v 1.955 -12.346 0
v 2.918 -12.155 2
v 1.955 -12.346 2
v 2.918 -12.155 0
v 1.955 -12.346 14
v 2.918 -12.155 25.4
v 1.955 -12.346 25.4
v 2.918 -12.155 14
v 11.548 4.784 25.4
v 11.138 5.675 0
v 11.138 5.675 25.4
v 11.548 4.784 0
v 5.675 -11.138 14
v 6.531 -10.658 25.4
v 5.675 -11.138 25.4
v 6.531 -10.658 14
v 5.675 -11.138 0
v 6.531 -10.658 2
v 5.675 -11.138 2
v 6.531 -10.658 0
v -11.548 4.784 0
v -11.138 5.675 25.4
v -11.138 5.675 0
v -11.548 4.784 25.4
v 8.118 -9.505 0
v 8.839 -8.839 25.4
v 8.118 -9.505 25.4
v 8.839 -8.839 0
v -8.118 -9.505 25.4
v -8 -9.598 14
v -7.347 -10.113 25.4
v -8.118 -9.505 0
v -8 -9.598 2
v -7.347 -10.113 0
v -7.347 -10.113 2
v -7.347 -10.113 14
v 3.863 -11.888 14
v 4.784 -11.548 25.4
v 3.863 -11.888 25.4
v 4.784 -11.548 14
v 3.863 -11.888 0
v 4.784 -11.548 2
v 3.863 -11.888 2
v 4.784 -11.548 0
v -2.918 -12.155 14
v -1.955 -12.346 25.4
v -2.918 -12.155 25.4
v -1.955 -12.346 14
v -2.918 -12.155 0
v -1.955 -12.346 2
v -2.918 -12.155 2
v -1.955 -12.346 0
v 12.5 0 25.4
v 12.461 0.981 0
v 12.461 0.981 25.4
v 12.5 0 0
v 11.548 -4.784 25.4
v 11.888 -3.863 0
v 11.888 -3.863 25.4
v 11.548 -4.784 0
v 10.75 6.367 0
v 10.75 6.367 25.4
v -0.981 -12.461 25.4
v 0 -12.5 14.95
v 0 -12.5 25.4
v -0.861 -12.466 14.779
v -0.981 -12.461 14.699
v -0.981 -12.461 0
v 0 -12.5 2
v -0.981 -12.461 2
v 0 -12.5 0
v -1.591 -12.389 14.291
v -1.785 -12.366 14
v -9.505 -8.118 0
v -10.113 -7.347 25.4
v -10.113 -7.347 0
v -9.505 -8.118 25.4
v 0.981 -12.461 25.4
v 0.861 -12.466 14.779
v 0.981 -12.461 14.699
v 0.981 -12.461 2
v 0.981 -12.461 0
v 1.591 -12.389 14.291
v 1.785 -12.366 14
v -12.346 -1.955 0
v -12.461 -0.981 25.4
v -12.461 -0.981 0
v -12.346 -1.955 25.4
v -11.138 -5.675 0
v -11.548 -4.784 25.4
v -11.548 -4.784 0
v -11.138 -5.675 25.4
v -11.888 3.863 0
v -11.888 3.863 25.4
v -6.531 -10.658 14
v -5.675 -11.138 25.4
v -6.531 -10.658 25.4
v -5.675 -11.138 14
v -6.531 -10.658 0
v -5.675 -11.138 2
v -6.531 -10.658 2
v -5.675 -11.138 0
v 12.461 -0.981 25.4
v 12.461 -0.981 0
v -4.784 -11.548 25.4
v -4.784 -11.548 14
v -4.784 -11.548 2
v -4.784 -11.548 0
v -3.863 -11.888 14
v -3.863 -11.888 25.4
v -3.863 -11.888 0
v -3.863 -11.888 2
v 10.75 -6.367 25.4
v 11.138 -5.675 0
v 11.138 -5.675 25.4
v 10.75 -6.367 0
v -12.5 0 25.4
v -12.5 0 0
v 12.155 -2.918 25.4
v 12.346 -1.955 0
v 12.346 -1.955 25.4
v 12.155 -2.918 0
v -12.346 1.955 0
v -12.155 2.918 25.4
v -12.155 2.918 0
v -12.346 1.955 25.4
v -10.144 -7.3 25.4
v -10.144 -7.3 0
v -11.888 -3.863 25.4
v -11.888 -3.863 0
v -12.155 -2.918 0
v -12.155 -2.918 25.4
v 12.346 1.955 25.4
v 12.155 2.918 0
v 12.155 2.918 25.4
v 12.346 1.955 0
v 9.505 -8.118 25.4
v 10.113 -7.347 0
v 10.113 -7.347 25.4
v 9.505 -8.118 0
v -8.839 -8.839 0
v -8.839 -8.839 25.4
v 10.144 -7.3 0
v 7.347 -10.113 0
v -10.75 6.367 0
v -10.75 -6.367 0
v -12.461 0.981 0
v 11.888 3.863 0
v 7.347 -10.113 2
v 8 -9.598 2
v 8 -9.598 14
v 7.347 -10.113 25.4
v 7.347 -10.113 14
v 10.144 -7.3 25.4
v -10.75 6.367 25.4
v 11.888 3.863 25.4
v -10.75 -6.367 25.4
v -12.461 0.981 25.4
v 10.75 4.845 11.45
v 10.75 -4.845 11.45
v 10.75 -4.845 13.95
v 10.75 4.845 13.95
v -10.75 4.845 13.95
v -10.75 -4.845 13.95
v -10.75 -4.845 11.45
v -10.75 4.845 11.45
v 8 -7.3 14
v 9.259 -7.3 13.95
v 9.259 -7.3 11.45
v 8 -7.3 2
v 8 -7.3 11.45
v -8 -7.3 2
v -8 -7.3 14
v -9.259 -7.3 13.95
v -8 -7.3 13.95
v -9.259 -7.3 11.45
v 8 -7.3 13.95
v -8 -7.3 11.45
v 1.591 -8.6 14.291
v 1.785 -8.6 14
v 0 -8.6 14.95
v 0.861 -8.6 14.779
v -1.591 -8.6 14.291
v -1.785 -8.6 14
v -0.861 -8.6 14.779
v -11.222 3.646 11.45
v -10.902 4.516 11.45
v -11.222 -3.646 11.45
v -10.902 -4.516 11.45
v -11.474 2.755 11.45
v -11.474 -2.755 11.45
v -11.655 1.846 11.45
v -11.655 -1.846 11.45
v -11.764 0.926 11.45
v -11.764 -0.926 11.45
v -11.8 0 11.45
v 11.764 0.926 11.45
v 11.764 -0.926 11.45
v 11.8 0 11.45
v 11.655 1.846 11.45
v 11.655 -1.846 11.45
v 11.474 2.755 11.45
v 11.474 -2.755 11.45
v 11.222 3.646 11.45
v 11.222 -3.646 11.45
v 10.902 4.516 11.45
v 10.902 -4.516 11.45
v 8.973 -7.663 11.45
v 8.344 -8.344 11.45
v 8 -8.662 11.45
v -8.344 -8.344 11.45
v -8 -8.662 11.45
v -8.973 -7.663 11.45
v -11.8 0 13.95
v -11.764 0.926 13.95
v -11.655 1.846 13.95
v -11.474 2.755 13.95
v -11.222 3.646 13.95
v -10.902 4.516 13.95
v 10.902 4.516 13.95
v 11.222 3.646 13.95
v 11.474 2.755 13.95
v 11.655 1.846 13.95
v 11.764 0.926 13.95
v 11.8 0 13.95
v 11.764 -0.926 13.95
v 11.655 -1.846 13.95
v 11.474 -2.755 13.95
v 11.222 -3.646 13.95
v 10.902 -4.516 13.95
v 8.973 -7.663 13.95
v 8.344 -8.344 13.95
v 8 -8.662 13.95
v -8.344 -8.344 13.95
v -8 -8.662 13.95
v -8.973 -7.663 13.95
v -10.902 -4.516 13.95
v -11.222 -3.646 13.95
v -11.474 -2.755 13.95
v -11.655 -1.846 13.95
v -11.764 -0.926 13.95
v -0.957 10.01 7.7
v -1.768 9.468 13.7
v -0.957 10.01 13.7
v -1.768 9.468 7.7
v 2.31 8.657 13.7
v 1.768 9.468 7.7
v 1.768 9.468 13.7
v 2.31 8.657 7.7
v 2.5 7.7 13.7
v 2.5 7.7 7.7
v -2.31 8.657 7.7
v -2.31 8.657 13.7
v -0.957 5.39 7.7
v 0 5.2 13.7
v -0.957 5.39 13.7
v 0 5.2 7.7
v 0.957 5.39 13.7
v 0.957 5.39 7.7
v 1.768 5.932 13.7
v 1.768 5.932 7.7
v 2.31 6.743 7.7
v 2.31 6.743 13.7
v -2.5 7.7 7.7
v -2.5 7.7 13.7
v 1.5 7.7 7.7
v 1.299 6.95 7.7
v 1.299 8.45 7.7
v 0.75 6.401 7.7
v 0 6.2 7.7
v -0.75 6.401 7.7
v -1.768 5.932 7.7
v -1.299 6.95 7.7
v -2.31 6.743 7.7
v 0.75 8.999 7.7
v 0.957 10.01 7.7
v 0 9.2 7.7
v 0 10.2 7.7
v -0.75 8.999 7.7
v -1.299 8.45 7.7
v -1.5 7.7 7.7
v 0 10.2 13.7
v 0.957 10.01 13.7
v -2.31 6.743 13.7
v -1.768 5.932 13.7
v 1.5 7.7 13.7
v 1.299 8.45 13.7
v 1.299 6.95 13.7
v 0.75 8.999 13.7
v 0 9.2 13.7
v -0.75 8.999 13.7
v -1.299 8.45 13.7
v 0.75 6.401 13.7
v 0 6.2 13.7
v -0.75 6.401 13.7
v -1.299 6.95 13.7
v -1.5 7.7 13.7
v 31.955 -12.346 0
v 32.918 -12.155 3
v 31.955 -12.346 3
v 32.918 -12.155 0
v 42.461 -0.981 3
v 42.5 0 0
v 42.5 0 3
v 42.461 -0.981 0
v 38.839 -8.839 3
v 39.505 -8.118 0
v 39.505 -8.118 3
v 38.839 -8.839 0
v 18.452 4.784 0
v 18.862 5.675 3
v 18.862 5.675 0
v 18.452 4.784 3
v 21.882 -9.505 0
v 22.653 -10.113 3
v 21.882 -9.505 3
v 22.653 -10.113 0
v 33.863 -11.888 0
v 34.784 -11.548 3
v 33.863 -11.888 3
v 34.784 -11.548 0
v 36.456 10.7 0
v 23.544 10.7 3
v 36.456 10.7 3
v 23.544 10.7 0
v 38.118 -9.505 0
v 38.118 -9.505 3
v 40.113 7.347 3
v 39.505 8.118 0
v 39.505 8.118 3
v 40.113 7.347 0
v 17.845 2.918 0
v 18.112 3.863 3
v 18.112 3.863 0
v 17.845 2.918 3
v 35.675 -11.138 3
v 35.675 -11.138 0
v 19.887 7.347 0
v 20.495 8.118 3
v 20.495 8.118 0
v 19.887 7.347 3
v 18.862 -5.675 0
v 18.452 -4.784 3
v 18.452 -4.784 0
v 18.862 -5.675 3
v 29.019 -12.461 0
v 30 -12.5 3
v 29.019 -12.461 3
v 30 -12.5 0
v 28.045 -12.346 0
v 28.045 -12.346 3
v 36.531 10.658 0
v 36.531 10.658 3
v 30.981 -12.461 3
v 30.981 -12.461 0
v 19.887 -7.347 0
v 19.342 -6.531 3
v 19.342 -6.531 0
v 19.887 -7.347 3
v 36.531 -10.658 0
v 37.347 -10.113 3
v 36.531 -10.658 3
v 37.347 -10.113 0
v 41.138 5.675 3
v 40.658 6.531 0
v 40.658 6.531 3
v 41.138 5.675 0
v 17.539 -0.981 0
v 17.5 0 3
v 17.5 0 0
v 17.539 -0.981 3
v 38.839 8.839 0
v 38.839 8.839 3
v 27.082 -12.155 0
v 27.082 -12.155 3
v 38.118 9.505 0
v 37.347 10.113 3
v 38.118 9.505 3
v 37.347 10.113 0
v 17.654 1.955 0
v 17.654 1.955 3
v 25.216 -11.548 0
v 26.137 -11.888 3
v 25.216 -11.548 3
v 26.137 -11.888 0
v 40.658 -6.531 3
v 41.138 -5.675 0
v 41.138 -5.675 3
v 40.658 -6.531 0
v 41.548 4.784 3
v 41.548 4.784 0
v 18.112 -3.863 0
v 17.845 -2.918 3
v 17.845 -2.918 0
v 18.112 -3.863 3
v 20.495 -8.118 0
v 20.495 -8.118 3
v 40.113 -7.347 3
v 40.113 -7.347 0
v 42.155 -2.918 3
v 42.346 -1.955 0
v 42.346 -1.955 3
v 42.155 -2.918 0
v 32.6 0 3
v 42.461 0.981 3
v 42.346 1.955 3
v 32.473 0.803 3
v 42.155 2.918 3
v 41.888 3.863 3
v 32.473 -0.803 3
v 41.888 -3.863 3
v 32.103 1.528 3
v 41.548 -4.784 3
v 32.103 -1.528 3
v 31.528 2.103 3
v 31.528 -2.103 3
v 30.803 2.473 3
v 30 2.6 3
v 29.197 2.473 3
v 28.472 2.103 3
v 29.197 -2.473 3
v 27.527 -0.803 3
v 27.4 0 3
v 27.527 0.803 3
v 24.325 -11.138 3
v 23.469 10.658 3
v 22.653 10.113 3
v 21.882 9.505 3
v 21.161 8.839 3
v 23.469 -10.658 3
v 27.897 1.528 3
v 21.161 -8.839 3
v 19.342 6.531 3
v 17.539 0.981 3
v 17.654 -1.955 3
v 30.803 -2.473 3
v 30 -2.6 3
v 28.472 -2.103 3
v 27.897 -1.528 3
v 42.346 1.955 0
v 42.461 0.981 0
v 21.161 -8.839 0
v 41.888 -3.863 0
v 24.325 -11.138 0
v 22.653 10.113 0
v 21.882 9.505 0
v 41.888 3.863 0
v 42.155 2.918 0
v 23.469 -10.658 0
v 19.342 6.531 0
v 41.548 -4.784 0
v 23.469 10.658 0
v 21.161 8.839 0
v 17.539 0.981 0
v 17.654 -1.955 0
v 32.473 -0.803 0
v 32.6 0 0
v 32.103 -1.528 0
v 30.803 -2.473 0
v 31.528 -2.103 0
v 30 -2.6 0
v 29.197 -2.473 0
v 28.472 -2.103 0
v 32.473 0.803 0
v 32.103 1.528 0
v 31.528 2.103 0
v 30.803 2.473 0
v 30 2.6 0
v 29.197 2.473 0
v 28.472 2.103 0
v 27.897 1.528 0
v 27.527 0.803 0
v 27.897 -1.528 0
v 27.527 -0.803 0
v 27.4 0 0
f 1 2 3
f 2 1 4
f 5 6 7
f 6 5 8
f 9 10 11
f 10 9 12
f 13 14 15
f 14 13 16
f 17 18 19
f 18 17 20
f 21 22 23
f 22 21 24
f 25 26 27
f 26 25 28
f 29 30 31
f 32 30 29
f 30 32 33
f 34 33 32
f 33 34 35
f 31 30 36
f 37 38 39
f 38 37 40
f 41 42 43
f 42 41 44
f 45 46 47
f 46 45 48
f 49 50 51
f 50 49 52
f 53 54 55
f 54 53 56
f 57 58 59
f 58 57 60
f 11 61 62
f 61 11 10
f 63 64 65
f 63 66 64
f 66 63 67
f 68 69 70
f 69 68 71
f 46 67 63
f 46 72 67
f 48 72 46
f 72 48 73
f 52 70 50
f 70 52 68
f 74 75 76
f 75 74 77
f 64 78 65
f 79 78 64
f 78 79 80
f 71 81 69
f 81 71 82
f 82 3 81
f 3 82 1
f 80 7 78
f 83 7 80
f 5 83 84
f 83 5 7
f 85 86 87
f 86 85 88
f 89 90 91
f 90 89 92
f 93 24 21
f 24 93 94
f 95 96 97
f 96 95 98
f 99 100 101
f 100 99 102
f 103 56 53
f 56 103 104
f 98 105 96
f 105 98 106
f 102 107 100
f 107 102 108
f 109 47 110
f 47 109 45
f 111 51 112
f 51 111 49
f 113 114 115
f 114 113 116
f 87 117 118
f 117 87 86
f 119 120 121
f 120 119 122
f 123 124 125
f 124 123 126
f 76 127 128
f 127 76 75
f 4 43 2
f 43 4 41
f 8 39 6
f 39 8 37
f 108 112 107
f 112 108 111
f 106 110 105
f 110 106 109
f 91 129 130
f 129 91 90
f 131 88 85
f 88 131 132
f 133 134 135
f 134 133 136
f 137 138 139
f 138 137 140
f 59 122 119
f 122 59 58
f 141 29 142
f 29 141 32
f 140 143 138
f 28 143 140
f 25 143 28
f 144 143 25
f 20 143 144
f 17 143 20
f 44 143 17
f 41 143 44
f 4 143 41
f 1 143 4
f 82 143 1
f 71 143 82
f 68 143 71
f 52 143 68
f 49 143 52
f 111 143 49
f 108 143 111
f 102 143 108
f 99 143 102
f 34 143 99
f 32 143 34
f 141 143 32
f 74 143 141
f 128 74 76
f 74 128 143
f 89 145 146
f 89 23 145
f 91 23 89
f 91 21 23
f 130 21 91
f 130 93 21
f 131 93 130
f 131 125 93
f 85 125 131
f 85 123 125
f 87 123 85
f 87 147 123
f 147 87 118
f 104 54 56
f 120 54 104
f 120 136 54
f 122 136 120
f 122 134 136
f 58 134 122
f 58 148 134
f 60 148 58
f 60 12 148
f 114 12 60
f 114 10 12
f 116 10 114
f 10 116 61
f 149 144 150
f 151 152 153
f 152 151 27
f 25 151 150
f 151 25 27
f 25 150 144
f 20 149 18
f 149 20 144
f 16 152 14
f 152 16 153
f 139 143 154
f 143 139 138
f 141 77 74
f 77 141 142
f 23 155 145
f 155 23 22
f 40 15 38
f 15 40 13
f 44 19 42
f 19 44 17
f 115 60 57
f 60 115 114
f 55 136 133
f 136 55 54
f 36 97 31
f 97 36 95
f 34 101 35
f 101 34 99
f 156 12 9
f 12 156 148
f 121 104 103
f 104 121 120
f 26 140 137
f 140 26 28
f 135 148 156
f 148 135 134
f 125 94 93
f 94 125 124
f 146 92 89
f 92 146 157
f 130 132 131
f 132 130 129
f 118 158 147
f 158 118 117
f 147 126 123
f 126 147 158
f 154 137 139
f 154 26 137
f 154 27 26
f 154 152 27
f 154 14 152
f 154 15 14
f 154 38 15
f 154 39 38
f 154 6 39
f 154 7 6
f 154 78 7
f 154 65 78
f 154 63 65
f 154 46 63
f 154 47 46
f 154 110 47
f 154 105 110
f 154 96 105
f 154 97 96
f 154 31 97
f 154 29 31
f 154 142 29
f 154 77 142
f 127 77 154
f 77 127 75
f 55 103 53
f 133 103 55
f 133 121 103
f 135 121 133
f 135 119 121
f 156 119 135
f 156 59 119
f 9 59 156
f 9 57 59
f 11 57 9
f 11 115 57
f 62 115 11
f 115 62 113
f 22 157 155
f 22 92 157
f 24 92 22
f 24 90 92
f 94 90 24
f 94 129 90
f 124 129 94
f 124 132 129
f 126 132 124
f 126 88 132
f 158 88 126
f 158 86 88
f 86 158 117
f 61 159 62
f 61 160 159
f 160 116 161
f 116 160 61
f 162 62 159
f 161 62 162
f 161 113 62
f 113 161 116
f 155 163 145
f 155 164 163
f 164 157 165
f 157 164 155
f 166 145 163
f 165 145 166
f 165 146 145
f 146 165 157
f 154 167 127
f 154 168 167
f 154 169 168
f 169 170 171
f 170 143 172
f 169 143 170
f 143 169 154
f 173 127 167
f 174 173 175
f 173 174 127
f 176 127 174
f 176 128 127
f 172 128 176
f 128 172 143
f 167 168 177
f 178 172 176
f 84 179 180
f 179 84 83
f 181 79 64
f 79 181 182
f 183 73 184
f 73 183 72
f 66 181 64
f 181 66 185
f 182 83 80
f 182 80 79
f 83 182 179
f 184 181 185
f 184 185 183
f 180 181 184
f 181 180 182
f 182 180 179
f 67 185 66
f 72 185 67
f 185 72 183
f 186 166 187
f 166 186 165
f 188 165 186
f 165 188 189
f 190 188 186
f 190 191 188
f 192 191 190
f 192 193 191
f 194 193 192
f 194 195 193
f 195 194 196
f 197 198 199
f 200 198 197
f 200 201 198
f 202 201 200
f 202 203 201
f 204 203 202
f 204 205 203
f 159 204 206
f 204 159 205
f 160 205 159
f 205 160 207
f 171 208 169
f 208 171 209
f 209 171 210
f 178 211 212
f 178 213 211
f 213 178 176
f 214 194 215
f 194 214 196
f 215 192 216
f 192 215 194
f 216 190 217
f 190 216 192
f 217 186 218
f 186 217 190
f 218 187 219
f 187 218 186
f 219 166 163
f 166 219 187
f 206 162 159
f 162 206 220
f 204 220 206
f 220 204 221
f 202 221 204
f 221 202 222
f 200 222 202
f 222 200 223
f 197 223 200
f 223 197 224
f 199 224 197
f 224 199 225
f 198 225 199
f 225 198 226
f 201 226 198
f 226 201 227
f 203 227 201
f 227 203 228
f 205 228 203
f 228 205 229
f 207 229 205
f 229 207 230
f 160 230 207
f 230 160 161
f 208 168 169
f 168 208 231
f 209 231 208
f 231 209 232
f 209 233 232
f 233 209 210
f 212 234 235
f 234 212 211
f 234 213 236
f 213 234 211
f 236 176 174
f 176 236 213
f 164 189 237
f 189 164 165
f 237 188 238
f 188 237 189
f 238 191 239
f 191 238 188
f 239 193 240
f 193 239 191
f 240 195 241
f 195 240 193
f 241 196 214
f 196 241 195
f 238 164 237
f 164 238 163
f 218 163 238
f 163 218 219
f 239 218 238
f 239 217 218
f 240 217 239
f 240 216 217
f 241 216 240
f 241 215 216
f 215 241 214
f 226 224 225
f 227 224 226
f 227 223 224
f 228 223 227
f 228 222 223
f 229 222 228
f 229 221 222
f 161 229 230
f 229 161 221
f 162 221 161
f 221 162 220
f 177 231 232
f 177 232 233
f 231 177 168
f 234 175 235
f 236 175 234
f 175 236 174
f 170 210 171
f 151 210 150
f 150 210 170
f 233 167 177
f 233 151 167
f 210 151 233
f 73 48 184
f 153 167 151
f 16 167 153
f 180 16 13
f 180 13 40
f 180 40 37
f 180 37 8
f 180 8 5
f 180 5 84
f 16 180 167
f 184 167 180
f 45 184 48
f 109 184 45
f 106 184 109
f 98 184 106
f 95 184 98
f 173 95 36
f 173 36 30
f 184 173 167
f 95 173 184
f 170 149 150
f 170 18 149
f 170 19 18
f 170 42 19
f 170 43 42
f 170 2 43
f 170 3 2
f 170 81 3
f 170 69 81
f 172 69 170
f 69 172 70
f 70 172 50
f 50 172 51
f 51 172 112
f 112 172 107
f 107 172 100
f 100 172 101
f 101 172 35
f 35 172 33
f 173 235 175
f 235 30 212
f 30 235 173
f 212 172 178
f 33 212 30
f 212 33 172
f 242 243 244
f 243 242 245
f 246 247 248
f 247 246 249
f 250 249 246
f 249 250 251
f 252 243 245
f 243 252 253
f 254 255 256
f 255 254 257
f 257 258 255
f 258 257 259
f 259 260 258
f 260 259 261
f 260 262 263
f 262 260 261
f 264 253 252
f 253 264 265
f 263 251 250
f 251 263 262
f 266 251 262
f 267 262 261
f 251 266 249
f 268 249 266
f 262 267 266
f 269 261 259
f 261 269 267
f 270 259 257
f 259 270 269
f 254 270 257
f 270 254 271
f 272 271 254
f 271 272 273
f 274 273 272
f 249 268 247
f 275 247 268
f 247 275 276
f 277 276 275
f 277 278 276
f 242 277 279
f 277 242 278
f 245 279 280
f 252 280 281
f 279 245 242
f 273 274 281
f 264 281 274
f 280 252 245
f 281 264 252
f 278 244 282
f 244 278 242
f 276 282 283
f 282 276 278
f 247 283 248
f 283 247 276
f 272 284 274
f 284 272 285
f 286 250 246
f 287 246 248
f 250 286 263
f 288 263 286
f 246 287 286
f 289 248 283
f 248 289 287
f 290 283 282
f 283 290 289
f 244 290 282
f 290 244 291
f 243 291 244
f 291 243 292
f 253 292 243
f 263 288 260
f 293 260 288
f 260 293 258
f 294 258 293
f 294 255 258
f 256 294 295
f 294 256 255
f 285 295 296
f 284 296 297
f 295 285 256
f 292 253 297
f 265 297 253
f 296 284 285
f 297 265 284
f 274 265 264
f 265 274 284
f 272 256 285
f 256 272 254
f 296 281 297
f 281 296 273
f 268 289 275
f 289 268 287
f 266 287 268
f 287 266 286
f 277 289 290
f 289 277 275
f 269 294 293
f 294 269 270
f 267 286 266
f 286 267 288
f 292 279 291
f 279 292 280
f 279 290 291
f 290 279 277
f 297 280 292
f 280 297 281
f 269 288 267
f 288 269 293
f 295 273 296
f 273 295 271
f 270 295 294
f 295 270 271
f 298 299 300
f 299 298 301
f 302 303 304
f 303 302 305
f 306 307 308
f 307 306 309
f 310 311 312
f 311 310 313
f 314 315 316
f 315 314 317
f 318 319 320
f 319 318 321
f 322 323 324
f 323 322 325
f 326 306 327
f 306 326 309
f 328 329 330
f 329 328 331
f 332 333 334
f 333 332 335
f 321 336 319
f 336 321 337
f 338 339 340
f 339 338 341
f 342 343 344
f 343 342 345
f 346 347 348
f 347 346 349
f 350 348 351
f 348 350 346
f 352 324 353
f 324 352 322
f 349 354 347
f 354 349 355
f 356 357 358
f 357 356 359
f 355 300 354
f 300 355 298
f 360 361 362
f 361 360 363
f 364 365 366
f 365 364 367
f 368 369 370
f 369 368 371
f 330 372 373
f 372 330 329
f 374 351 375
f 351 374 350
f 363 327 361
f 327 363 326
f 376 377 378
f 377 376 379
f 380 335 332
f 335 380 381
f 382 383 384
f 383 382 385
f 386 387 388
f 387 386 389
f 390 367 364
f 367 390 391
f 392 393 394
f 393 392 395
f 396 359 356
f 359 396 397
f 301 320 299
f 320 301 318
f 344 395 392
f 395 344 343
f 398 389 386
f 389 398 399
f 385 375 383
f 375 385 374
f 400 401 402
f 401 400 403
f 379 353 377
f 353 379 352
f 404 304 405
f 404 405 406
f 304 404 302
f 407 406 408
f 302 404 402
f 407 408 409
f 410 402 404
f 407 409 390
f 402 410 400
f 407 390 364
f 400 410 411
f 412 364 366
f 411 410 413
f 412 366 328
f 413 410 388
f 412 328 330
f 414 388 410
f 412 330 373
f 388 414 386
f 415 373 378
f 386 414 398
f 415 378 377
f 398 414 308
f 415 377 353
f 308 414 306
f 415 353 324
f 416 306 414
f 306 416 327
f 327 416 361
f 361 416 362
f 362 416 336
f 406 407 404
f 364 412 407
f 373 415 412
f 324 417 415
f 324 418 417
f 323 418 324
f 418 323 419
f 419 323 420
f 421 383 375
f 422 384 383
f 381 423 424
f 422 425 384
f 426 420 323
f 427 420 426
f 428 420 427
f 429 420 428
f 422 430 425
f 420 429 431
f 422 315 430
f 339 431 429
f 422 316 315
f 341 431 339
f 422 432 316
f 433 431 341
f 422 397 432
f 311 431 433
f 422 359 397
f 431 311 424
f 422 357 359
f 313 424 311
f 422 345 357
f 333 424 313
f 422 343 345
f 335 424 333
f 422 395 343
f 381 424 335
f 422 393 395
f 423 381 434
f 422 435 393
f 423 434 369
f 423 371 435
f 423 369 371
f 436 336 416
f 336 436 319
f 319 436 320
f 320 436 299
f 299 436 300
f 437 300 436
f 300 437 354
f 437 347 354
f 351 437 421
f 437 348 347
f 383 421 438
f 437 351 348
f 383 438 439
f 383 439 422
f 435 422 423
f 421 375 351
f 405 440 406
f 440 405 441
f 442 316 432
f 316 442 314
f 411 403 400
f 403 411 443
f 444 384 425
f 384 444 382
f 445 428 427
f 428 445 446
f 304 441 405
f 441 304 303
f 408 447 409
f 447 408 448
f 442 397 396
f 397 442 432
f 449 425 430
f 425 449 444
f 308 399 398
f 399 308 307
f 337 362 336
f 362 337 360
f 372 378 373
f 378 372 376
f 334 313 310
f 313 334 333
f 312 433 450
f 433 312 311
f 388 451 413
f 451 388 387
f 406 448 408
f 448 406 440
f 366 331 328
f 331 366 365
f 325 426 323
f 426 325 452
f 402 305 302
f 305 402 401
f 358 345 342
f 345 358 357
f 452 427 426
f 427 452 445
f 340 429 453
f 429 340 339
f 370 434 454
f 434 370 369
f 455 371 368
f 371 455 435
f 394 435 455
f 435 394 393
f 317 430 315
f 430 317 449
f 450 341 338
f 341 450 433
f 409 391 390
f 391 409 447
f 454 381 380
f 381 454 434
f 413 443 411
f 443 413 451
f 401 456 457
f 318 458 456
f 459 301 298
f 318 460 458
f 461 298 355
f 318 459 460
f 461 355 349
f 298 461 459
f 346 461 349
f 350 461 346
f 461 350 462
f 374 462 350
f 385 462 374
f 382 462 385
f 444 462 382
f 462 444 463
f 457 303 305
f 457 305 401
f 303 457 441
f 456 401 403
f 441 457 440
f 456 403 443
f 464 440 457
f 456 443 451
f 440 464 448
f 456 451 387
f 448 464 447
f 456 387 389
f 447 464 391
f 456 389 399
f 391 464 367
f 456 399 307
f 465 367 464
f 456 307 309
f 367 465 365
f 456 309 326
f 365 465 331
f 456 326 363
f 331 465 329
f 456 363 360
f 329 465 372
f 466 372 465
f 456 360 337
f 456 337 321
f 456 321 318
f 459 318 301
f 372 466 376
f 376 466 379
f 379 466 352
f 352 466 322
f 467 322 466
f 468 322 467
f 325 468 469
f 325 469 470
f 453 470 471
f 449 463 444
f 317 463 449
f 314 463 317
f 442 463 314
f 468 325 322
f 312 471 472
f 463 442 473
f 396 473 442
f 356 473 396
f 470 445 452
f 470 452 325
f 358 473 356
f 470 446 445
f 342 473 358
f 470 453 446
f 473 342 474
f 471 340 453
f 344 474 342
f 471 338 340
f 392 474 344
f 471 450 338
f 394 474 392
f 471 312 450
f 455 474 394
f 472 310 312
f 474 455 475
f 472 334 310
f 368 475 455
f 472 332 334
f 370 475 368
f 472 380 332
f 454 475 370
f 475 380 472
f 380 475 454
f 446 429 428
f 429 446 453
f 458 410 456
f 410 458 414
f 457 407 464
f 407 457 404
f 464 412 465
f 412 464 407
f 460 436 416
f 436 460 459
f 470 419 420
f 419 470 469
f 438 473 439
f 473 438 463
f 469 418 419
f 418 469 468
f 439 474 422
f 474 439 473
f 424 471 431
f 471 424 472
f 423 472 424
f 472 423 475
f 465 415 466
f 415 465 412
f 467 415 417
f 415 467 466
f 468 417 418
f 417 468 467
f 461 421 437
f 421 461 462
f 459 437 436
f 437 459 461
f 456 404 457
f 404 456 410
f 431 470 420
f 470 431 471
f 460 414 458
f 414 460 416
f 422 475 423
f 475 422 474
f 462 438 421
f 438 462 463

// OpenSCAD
/**
 * bird_element_hf.scad — TM-PWR-ENCL-EL-001 Rev A
 * HF / VHF plug-in slug element body
 * 25.0mm OD × 25.4mm, D-flat orientation key, 2mm banana pin
 * Fits Bird Model 43 compatible wattmeter body
 */

// ─── Parameters ──────────────────────────────────────────────────────────────
slug_od      = 25.0;   // Outer diameter (0.2mm under body slot for clearance)
slug_l       = 25.4;   // Length (1.000")
slug_flat    = 1.8;    // Flat depth (from OD surface, creates D-shape)

center_bore  = 5.2;    // Center conductor bore (slightly over 5mm for clearance)
pcb_w        = 21.5;   // PCB slot width
pcb_d        = 18.0;   // PCB slot depth
pcb_t        = 1.8;    // PCB slot thickness (1.6mm PCB + 0.2mm clearance)

banana_d     = 2.2;    // 2mm banana pin hole
banana_x     = slug_l / 2;  // Centered along length
banana_depth = 8;       // Depth of banana pin well

oring_d      = 25.0;   // O-ring groove diameter
oring_w      = 2.5;    // O-ring groove width
oring_depth  = 1.5;    // O-ring groove depth (for 2mm O-ring)
oring_pos    = slug_l / 2;  // O-ring at slug midpoint

// PCB access slot (open bottom for component access during assembly)
slot_w       = 16;
slot_h       = 12;
slot_z       = 2;     // From bottom end of slug

// Label recess (on flat face)
label_w      = 18;
label_h      = 8;
label_depth  = 0.4;   // Engraved text depth

// ─── Modules ──────────────────────────────────────────────────────────────────

module slug_body_profile() {
    // D-shape cross-section: circle with one flat
    difference() {
        circle(d=slug_od, $fn=80);
        translate([-(slug_od), slug_od/2 - slug_flat])
            square([slug_od * 2, slug_od]);
    }
}

module oring_groove() {
    rotate_extrude($fn=80)
        translate([oring_d/2 - oring_depth, 0, 0])
            square([oring_depth + 0.1, oring_w], center=true);
}

// ─── Main Slug Body ───────────────────────────────────────────────────────────
module slug() {
    difference() {
        // D-shaped extruded body
        linear_extrude(slug_l)
            slug_body_profile();

        // Center conductor bore (RF through-hole, centered at circle axis)
        translate([0, 0, -0.1])
            cylinder(d=center_bore, h=slug_l + 0.2, $fn=20);

        // PCB slot (axial, from flat face side)
        translate([-pcb_w/2, slug_od/2 - slug_flat - pcb_d, slug_z_for_pcb()])
            cube([pcb_w, pcb_d + 0.1, pcb_t]);

        // PCB slot continues full length for coaxial components
        translate([-pcb_w/2, slug_od/2 - slug_flat - pcb_d, 0])
            cube([pcb_w, pcb_d, slug_l]);

        // Banana pin hole (bottom center, for slug output contact)
        translate([0, -slug_od/2 - 0.1, banana_x])
            rotate([-90, 0, 0])
                cylinder(d=banana_d, h=banana_depth + 0.1, $fn=16);

        // Banana pin counterbore (wider, for nut/flange)
        translate([0, -slug_od/2 - 0.1, banana_x])
            rotate([-90, 0, 0])
                cylinder(d=4.5, h=4, $fn=16);

        // O-ring groove (at slug midpoint)
        translate([0, 0, oring_pos])
            oring_groove();

        // Label recess (on flat face)
        translate([-label_w/2, slug_od/2 - slug_flat - label_depth, slug_l/2])
            cube([label_w, label_depth + 0.1, label_h], center=false);

        // Component access slot (from round side, for toroid winding access)
        translate([-slot_w/2, -slug_od/2 - 0.1, slot_z])
            cube([slot_w, slug_od/3 + 0.1, slot_h]);
    }

    // Toroid retention boss (center of PCB cavity)
    // Small post that the toroid seats against
    translate([0, slug_od/2 - slug_flat - 3, slug_l/2 - 5])
        difference() {
            cylinder(d=5, h=6, $fn=16);
            cylinder(d=3, h=6.1, $fn=12);  // toroid pin hole
        }
}

function slug_z_for_pcb() = 1.5;  // PCB slot starts 1.5mm from end

// ─── Slug Cap (optional, covers PCB end) ─────────────────────────────────────
module slug_cap() {
    difference() {
        linear_extrude(3)
            slug_body_profile();
        translate([0, 0, -0.1])
            cylinder(d=center_bore, h=3.2, $fn=20);
        // Snap into O-ring groove when installed
    }
}

// ─── Render ───────────────────────────────────────────────────────────────────
slug();
translate([slug_od + 5, 0, 0]) slug_cap();

// ─── Notes ────────────────────────────────────────────────────────────────────
// Material: PLA+ (for rigidity, dimensional accuracy)
//           PETG if higher temperature environment (e.g., near PA amplifier)
// Layer:    0.15mm for best dimensional accuracy of O-ring groove
// Infill:   40% for structural rigidity around center bore
// Supports: None required
//
// Assembly:
// (1) Install PCB wafer (22×18mm) into PCB slot — toroid + detector circuit
// (2) Thread secondary winding through center conductor bore during install
// (3) Solder center conductor pin into center bore (tin slug bore first)
// (4) Install 2mm banana pin — solder or press-fit
// (5) Apply O-ring (25.0 × 2mm Buna-N) into groove
// (6) Test: connect to body, verify meter deflects with RF applied
//
// Identification:
// Print element range on flat face with label recess or use small label.
// Color-code via filament: green=HF-10, yellow=HF-100, orange=HF-1kW, red=HF-3kW
